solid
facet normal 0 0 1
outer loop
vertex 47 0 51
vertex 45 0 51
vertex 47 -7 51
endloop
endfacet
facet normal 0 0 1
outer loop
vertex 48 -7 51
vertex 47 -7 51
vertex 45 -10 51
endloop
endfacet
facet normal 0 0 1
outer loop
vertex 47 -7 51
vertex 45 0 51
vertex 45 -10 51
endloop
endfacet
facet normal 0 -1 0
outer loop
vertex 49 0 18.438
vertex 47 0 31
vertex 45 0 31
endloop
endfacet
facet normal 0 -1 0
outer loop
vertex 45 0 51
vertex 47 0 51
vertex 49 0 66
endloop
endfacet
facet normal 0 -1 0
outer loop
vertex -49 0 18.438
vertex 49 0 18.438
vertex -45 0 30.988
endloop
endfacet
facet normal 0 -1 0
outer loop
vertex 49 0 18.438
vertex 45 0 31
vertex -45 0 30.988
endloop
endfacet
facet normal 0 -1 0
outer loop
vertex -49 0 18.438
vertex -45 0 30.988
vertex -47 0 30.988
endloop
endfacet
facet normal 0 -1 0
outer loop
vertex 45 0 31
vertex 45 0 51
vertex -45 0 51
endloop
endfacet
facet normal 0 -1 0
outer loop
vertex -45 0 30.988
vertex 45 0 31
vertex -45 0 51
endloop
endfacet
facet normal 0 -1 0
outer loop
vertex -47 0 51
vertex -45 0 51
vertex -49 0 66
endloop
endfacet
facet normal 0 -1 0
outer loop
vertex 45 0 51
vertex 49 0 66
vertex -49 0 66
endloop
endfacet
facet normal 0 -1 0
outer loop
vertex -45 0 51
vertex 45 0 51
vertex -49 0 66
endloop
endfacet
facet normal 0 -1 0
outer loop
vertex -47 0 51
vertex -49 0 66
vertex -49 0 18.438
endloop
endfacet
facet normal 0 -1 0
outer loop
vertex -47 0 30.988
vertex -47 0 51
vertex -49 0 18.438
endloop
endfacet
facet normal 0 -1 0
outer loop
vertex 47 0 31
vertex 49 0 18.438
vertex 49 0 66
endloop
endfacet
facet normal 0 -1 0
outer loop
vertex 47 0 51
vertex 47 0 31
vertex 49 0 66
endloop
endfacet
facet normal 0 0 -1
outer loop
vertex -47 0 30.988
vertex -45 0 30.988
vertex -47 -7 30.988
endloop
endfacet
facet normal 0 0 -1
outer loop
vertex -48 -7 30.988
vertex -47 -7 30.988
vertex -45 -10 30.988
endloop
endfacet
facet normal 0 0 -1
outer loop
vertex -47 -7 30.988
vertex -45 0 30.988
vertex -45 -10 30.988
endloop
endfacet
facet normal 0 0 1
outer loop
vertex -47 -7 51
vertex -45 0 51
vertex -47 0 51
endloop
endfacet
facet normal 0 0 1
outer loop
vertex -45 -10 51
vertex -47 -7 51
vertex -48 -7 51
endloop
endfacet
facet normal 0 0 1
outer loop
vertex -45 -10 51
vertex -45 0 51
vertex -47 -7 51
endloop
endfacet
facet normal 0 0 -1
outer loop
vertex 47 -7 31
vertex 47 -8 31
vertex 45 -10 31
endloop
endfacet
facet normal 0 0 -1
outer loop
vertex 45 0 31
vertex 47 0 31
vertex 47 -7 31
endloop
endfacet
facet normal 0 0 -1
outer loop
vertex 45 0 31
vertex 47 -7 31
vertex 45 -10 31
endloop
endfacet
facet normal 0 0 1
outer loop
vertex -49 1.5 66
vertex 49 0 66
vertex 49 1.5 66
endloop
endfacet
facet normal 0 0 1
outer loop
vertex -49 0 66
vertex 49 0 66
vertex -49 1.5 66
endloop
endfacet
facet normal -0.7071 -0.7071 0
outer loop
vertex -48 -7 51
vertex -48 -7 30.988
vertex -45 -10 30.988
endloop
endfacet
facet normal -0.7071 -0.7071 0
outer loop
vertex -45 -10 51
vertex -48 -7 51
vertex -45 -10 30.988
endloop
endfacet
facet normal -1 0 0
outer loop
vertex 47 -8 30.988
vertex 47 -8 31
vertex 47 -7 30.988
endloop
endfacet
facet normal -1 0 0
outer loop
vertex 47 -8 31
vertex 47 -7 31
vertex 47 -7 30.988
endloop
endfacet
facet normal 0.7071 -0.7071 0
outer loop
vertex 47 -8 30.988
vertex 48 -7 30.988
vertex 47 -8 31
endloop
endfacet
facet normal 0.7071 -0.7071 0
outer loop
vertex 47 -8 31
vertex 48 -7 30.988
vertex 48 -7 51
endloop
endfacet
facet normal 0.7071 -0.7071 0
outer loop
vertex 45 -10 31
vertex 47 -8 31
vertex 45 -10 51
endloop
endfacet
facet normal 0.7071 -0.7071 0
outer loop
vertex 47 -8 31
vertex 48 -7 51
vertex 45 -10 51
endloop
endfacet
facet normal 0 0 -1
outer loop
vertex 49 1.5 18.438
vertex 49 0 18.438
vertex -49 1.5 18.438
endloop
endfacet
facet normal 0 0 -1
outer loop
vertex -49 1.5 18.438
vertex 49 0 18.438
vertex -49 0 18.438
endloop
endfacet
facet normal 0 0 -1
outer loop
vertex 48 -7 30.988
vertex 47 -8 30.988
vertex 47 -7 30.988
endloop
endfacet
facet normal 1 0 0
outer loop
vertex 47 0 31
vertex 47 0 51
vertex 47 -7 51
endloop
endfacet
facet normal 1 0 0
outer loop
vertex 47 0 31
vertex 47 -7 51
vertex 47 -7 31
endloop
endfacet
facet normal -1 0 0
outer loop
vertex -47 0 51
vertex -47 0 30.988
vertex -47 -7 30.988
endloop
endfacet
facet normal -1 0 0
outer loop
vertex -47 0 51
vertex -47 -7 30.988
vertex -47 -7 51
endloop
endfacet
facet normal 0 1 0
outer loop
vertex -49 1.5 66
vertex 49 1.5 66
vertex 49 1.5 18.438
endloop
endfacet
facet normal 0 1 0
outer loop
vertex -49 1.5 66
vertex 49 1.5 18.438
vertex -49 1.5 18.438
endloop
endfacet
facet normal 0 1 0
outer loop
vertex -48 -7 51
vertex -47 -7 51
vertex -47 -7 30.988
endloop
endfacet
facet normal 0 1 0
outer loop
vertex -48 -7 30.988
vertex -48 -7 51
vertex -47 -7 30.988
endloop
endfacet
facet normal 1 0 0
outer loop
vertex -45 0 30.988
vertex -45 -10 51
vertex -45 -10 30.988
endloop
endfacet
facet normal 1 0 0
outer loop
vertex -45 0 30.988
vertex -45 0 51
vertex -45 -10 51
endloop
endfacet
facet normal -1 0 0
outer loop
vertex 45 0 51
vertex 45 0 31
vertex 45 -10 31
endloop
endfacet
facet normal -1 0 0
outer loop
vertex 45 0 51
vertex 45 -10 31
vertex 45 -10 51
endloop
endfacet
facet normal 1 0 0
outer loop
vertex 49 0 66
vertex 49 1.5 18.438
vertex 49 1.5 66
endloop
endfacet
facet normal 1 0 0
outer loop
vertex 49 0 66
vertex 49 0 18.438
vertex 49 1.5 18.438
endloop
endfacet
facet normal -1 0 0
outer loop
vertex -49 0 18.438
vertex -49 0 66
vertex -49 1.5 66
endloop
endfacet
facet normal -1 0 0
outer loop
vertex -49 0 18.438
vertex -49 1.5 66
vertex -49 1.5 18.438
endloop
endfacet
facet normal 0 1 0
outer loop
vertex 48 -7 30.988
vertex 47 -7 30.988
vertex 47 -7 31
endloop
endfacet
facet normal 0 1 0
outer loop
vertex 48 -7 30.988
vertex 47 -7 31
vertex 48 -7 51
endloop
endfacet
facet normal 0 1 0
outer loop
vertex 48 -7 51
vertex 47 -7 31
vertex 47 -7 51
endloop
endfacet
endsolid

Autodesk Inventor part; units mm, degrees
ref_plane "YZ Plane" through (0, 0, 0) normal (1, 0, 0) x (0, 1, 0)
ref_plane "XZ Plane" through (0, 0, 0) normal (0, 1, 0) x (-1, 0, 0)
ref_plane "XY Plane" through (0, 0, 0) normal (0, 0, 1) x (1, 0, 0)
sketch "Boceto1" plane through (0, 0, 0) normal (0, 1, 0) x (-1, 0, 0)
  line L0 (-15, 66) -> (-49, 66)
  line L1 (45, 18.438) -> (49, 18.438)
  line L2 (-49, 66) -> (49, 66)
  line L3 (49, 66) -> (49, 18.438)
  line L4 (49, 18.438) -> (-49, 18.438)
  line L5 (-49, 18.438) -> (-49, 66)
  line L6 (-47, 51) -> (-45, 51)
  line L7 (-47, 51) -> (-45, 51)
  line L8 (-45, 51) -> (-45, 31)
  line L9 (-45, 31) -> (-47, 31)
  line L10 (-47, 31) -> (-47, 51)
  line L11 (45, 51.5) -> (45, 42.5)
  line L12 (47, 51) -> (47, 31)
  line L13 (45, 51.5) -> (47, 51.5)
  line L14 (47, 51.5) -> (47, 31)
  line L15 (47, 31) -> (45, 31)
  line L16 (45, 31) -> (45, 51.5)
  point P0 (0, 0)
extrude "Extrusión1" add sketch "Boceto1" along normal blind 1.5 contours L2 L3 L1 L4 L5 L0 | L6 L8 L9 L10 | L13 L14 L12 L15 L16 L11
sketch "Boceto2" plane through (0, 0, 0) normal (0, -1, 0) x (1, 0, 0)
  line L0 (-47, 51) -> (-45, 51)
  line L1 (-45, 51) -> (-45, 30.9876)
  line L2 (-45, 30.9876) -> (-47, 30.9876)
  line L3 (-47, 30.9876) -> (-47, 51)
  line L4 (45, 51) -> (47, 51)
  line L5 (47, 51) -> (47, 31)
  line L6 (47, 31) -> (45, 31)
  line L7 (45, 31) -> (45, 51)
  point P0 (0, 0)
extrude "Extrusión2" add sketch "Boceto2" along normal blind 10
sketch "Boceto3" plane through (-47, 0, 30.9876) normal (-1, 0, 0) x (0, 0, 1)
  line L0 (0, -10) -> (20.0124, -10) projected
  line L1 (20.0124, 0) -> (20.0124, -10) projected
  line L2 (0, -10) -> (20.0124, -10)
  line L3 (20.0124, -10) -> (20.0124, -7)
  line L4 (20.0124, -7) -> (0, -7)
  line L5 (0, -7) -> (0, -10)
  dimension "d4" = 3
extrude "Extrusión3" add sketch "Boceto3" along normal blind 1
sketch "Boceto5" plane through (47, 0, 51) normal (1, 0, 0) x (0, 0, -1)
  line L0 (20.0124, -10) -> (0, -10) projected
  line L1 (0, -10) -> (20.0124, -10)
  line L2 (20.0124, -10) -> (20.0124, -7)
  line L3 (20.0124, -7) -> (0, -7)
  line L4 (0, -7) -> (0, -10)
  point P0 (51, 0)
  dimension "d8" = 3
extrude "Extrusión4" add sketch "Boceto5" along normal blind 1
sketch "Boceto7" plane through (-49, 0, 66) normal (0, 0, 1) x (1, 0, 0)
  line L0 (49, 0) -> (49, 1.3987)
  line L1 (4, -10) -> (1, -10) projected
  line L2 (2, -7) -> (1, -7) projected
  line L3 (4, -10) -> (1, -10)
  line L4 (1, -10) -> (1, -7)
  line L5 (4, -7) -> (4, -10)
  line L6 (1, -7) -> (4, -10)
  line L7 (1, -10) -> (4, -10)
  line L8 (1, -7) -> (1, -10)
  line L9 (94, -10) -> (97, -10)
  line L10 (97, -10) -> (97, -7)
  line L11 (97, -7) -> (94, -10)
extrude "Extrusión5" cut sketch "Boceto7" against normal blind 48.25
equation "\"Radio_pliegue\" = Grosor"
equation "\"Anchura_desahogo_plegado\" = Grosor"
equation "\"Profundidad_desahogo_plegado\" = 0.5 * Grosor"
equation "\"Tamaño_destalonado\" = 4 * Grosor"
equation "\"Remanente_mínimo\" = 2 * Grosor"
equation "\"Radiodetransición\" = Radio_pliegue"
equation "\"Tamaño_de_radio_de_Jacobi\" = Radio_pliegue"
equation "\"TamañoSeparación\" = Grosor"
equation "\"Grosor\" = 0.5"
properties part number "TapaOnixium"
